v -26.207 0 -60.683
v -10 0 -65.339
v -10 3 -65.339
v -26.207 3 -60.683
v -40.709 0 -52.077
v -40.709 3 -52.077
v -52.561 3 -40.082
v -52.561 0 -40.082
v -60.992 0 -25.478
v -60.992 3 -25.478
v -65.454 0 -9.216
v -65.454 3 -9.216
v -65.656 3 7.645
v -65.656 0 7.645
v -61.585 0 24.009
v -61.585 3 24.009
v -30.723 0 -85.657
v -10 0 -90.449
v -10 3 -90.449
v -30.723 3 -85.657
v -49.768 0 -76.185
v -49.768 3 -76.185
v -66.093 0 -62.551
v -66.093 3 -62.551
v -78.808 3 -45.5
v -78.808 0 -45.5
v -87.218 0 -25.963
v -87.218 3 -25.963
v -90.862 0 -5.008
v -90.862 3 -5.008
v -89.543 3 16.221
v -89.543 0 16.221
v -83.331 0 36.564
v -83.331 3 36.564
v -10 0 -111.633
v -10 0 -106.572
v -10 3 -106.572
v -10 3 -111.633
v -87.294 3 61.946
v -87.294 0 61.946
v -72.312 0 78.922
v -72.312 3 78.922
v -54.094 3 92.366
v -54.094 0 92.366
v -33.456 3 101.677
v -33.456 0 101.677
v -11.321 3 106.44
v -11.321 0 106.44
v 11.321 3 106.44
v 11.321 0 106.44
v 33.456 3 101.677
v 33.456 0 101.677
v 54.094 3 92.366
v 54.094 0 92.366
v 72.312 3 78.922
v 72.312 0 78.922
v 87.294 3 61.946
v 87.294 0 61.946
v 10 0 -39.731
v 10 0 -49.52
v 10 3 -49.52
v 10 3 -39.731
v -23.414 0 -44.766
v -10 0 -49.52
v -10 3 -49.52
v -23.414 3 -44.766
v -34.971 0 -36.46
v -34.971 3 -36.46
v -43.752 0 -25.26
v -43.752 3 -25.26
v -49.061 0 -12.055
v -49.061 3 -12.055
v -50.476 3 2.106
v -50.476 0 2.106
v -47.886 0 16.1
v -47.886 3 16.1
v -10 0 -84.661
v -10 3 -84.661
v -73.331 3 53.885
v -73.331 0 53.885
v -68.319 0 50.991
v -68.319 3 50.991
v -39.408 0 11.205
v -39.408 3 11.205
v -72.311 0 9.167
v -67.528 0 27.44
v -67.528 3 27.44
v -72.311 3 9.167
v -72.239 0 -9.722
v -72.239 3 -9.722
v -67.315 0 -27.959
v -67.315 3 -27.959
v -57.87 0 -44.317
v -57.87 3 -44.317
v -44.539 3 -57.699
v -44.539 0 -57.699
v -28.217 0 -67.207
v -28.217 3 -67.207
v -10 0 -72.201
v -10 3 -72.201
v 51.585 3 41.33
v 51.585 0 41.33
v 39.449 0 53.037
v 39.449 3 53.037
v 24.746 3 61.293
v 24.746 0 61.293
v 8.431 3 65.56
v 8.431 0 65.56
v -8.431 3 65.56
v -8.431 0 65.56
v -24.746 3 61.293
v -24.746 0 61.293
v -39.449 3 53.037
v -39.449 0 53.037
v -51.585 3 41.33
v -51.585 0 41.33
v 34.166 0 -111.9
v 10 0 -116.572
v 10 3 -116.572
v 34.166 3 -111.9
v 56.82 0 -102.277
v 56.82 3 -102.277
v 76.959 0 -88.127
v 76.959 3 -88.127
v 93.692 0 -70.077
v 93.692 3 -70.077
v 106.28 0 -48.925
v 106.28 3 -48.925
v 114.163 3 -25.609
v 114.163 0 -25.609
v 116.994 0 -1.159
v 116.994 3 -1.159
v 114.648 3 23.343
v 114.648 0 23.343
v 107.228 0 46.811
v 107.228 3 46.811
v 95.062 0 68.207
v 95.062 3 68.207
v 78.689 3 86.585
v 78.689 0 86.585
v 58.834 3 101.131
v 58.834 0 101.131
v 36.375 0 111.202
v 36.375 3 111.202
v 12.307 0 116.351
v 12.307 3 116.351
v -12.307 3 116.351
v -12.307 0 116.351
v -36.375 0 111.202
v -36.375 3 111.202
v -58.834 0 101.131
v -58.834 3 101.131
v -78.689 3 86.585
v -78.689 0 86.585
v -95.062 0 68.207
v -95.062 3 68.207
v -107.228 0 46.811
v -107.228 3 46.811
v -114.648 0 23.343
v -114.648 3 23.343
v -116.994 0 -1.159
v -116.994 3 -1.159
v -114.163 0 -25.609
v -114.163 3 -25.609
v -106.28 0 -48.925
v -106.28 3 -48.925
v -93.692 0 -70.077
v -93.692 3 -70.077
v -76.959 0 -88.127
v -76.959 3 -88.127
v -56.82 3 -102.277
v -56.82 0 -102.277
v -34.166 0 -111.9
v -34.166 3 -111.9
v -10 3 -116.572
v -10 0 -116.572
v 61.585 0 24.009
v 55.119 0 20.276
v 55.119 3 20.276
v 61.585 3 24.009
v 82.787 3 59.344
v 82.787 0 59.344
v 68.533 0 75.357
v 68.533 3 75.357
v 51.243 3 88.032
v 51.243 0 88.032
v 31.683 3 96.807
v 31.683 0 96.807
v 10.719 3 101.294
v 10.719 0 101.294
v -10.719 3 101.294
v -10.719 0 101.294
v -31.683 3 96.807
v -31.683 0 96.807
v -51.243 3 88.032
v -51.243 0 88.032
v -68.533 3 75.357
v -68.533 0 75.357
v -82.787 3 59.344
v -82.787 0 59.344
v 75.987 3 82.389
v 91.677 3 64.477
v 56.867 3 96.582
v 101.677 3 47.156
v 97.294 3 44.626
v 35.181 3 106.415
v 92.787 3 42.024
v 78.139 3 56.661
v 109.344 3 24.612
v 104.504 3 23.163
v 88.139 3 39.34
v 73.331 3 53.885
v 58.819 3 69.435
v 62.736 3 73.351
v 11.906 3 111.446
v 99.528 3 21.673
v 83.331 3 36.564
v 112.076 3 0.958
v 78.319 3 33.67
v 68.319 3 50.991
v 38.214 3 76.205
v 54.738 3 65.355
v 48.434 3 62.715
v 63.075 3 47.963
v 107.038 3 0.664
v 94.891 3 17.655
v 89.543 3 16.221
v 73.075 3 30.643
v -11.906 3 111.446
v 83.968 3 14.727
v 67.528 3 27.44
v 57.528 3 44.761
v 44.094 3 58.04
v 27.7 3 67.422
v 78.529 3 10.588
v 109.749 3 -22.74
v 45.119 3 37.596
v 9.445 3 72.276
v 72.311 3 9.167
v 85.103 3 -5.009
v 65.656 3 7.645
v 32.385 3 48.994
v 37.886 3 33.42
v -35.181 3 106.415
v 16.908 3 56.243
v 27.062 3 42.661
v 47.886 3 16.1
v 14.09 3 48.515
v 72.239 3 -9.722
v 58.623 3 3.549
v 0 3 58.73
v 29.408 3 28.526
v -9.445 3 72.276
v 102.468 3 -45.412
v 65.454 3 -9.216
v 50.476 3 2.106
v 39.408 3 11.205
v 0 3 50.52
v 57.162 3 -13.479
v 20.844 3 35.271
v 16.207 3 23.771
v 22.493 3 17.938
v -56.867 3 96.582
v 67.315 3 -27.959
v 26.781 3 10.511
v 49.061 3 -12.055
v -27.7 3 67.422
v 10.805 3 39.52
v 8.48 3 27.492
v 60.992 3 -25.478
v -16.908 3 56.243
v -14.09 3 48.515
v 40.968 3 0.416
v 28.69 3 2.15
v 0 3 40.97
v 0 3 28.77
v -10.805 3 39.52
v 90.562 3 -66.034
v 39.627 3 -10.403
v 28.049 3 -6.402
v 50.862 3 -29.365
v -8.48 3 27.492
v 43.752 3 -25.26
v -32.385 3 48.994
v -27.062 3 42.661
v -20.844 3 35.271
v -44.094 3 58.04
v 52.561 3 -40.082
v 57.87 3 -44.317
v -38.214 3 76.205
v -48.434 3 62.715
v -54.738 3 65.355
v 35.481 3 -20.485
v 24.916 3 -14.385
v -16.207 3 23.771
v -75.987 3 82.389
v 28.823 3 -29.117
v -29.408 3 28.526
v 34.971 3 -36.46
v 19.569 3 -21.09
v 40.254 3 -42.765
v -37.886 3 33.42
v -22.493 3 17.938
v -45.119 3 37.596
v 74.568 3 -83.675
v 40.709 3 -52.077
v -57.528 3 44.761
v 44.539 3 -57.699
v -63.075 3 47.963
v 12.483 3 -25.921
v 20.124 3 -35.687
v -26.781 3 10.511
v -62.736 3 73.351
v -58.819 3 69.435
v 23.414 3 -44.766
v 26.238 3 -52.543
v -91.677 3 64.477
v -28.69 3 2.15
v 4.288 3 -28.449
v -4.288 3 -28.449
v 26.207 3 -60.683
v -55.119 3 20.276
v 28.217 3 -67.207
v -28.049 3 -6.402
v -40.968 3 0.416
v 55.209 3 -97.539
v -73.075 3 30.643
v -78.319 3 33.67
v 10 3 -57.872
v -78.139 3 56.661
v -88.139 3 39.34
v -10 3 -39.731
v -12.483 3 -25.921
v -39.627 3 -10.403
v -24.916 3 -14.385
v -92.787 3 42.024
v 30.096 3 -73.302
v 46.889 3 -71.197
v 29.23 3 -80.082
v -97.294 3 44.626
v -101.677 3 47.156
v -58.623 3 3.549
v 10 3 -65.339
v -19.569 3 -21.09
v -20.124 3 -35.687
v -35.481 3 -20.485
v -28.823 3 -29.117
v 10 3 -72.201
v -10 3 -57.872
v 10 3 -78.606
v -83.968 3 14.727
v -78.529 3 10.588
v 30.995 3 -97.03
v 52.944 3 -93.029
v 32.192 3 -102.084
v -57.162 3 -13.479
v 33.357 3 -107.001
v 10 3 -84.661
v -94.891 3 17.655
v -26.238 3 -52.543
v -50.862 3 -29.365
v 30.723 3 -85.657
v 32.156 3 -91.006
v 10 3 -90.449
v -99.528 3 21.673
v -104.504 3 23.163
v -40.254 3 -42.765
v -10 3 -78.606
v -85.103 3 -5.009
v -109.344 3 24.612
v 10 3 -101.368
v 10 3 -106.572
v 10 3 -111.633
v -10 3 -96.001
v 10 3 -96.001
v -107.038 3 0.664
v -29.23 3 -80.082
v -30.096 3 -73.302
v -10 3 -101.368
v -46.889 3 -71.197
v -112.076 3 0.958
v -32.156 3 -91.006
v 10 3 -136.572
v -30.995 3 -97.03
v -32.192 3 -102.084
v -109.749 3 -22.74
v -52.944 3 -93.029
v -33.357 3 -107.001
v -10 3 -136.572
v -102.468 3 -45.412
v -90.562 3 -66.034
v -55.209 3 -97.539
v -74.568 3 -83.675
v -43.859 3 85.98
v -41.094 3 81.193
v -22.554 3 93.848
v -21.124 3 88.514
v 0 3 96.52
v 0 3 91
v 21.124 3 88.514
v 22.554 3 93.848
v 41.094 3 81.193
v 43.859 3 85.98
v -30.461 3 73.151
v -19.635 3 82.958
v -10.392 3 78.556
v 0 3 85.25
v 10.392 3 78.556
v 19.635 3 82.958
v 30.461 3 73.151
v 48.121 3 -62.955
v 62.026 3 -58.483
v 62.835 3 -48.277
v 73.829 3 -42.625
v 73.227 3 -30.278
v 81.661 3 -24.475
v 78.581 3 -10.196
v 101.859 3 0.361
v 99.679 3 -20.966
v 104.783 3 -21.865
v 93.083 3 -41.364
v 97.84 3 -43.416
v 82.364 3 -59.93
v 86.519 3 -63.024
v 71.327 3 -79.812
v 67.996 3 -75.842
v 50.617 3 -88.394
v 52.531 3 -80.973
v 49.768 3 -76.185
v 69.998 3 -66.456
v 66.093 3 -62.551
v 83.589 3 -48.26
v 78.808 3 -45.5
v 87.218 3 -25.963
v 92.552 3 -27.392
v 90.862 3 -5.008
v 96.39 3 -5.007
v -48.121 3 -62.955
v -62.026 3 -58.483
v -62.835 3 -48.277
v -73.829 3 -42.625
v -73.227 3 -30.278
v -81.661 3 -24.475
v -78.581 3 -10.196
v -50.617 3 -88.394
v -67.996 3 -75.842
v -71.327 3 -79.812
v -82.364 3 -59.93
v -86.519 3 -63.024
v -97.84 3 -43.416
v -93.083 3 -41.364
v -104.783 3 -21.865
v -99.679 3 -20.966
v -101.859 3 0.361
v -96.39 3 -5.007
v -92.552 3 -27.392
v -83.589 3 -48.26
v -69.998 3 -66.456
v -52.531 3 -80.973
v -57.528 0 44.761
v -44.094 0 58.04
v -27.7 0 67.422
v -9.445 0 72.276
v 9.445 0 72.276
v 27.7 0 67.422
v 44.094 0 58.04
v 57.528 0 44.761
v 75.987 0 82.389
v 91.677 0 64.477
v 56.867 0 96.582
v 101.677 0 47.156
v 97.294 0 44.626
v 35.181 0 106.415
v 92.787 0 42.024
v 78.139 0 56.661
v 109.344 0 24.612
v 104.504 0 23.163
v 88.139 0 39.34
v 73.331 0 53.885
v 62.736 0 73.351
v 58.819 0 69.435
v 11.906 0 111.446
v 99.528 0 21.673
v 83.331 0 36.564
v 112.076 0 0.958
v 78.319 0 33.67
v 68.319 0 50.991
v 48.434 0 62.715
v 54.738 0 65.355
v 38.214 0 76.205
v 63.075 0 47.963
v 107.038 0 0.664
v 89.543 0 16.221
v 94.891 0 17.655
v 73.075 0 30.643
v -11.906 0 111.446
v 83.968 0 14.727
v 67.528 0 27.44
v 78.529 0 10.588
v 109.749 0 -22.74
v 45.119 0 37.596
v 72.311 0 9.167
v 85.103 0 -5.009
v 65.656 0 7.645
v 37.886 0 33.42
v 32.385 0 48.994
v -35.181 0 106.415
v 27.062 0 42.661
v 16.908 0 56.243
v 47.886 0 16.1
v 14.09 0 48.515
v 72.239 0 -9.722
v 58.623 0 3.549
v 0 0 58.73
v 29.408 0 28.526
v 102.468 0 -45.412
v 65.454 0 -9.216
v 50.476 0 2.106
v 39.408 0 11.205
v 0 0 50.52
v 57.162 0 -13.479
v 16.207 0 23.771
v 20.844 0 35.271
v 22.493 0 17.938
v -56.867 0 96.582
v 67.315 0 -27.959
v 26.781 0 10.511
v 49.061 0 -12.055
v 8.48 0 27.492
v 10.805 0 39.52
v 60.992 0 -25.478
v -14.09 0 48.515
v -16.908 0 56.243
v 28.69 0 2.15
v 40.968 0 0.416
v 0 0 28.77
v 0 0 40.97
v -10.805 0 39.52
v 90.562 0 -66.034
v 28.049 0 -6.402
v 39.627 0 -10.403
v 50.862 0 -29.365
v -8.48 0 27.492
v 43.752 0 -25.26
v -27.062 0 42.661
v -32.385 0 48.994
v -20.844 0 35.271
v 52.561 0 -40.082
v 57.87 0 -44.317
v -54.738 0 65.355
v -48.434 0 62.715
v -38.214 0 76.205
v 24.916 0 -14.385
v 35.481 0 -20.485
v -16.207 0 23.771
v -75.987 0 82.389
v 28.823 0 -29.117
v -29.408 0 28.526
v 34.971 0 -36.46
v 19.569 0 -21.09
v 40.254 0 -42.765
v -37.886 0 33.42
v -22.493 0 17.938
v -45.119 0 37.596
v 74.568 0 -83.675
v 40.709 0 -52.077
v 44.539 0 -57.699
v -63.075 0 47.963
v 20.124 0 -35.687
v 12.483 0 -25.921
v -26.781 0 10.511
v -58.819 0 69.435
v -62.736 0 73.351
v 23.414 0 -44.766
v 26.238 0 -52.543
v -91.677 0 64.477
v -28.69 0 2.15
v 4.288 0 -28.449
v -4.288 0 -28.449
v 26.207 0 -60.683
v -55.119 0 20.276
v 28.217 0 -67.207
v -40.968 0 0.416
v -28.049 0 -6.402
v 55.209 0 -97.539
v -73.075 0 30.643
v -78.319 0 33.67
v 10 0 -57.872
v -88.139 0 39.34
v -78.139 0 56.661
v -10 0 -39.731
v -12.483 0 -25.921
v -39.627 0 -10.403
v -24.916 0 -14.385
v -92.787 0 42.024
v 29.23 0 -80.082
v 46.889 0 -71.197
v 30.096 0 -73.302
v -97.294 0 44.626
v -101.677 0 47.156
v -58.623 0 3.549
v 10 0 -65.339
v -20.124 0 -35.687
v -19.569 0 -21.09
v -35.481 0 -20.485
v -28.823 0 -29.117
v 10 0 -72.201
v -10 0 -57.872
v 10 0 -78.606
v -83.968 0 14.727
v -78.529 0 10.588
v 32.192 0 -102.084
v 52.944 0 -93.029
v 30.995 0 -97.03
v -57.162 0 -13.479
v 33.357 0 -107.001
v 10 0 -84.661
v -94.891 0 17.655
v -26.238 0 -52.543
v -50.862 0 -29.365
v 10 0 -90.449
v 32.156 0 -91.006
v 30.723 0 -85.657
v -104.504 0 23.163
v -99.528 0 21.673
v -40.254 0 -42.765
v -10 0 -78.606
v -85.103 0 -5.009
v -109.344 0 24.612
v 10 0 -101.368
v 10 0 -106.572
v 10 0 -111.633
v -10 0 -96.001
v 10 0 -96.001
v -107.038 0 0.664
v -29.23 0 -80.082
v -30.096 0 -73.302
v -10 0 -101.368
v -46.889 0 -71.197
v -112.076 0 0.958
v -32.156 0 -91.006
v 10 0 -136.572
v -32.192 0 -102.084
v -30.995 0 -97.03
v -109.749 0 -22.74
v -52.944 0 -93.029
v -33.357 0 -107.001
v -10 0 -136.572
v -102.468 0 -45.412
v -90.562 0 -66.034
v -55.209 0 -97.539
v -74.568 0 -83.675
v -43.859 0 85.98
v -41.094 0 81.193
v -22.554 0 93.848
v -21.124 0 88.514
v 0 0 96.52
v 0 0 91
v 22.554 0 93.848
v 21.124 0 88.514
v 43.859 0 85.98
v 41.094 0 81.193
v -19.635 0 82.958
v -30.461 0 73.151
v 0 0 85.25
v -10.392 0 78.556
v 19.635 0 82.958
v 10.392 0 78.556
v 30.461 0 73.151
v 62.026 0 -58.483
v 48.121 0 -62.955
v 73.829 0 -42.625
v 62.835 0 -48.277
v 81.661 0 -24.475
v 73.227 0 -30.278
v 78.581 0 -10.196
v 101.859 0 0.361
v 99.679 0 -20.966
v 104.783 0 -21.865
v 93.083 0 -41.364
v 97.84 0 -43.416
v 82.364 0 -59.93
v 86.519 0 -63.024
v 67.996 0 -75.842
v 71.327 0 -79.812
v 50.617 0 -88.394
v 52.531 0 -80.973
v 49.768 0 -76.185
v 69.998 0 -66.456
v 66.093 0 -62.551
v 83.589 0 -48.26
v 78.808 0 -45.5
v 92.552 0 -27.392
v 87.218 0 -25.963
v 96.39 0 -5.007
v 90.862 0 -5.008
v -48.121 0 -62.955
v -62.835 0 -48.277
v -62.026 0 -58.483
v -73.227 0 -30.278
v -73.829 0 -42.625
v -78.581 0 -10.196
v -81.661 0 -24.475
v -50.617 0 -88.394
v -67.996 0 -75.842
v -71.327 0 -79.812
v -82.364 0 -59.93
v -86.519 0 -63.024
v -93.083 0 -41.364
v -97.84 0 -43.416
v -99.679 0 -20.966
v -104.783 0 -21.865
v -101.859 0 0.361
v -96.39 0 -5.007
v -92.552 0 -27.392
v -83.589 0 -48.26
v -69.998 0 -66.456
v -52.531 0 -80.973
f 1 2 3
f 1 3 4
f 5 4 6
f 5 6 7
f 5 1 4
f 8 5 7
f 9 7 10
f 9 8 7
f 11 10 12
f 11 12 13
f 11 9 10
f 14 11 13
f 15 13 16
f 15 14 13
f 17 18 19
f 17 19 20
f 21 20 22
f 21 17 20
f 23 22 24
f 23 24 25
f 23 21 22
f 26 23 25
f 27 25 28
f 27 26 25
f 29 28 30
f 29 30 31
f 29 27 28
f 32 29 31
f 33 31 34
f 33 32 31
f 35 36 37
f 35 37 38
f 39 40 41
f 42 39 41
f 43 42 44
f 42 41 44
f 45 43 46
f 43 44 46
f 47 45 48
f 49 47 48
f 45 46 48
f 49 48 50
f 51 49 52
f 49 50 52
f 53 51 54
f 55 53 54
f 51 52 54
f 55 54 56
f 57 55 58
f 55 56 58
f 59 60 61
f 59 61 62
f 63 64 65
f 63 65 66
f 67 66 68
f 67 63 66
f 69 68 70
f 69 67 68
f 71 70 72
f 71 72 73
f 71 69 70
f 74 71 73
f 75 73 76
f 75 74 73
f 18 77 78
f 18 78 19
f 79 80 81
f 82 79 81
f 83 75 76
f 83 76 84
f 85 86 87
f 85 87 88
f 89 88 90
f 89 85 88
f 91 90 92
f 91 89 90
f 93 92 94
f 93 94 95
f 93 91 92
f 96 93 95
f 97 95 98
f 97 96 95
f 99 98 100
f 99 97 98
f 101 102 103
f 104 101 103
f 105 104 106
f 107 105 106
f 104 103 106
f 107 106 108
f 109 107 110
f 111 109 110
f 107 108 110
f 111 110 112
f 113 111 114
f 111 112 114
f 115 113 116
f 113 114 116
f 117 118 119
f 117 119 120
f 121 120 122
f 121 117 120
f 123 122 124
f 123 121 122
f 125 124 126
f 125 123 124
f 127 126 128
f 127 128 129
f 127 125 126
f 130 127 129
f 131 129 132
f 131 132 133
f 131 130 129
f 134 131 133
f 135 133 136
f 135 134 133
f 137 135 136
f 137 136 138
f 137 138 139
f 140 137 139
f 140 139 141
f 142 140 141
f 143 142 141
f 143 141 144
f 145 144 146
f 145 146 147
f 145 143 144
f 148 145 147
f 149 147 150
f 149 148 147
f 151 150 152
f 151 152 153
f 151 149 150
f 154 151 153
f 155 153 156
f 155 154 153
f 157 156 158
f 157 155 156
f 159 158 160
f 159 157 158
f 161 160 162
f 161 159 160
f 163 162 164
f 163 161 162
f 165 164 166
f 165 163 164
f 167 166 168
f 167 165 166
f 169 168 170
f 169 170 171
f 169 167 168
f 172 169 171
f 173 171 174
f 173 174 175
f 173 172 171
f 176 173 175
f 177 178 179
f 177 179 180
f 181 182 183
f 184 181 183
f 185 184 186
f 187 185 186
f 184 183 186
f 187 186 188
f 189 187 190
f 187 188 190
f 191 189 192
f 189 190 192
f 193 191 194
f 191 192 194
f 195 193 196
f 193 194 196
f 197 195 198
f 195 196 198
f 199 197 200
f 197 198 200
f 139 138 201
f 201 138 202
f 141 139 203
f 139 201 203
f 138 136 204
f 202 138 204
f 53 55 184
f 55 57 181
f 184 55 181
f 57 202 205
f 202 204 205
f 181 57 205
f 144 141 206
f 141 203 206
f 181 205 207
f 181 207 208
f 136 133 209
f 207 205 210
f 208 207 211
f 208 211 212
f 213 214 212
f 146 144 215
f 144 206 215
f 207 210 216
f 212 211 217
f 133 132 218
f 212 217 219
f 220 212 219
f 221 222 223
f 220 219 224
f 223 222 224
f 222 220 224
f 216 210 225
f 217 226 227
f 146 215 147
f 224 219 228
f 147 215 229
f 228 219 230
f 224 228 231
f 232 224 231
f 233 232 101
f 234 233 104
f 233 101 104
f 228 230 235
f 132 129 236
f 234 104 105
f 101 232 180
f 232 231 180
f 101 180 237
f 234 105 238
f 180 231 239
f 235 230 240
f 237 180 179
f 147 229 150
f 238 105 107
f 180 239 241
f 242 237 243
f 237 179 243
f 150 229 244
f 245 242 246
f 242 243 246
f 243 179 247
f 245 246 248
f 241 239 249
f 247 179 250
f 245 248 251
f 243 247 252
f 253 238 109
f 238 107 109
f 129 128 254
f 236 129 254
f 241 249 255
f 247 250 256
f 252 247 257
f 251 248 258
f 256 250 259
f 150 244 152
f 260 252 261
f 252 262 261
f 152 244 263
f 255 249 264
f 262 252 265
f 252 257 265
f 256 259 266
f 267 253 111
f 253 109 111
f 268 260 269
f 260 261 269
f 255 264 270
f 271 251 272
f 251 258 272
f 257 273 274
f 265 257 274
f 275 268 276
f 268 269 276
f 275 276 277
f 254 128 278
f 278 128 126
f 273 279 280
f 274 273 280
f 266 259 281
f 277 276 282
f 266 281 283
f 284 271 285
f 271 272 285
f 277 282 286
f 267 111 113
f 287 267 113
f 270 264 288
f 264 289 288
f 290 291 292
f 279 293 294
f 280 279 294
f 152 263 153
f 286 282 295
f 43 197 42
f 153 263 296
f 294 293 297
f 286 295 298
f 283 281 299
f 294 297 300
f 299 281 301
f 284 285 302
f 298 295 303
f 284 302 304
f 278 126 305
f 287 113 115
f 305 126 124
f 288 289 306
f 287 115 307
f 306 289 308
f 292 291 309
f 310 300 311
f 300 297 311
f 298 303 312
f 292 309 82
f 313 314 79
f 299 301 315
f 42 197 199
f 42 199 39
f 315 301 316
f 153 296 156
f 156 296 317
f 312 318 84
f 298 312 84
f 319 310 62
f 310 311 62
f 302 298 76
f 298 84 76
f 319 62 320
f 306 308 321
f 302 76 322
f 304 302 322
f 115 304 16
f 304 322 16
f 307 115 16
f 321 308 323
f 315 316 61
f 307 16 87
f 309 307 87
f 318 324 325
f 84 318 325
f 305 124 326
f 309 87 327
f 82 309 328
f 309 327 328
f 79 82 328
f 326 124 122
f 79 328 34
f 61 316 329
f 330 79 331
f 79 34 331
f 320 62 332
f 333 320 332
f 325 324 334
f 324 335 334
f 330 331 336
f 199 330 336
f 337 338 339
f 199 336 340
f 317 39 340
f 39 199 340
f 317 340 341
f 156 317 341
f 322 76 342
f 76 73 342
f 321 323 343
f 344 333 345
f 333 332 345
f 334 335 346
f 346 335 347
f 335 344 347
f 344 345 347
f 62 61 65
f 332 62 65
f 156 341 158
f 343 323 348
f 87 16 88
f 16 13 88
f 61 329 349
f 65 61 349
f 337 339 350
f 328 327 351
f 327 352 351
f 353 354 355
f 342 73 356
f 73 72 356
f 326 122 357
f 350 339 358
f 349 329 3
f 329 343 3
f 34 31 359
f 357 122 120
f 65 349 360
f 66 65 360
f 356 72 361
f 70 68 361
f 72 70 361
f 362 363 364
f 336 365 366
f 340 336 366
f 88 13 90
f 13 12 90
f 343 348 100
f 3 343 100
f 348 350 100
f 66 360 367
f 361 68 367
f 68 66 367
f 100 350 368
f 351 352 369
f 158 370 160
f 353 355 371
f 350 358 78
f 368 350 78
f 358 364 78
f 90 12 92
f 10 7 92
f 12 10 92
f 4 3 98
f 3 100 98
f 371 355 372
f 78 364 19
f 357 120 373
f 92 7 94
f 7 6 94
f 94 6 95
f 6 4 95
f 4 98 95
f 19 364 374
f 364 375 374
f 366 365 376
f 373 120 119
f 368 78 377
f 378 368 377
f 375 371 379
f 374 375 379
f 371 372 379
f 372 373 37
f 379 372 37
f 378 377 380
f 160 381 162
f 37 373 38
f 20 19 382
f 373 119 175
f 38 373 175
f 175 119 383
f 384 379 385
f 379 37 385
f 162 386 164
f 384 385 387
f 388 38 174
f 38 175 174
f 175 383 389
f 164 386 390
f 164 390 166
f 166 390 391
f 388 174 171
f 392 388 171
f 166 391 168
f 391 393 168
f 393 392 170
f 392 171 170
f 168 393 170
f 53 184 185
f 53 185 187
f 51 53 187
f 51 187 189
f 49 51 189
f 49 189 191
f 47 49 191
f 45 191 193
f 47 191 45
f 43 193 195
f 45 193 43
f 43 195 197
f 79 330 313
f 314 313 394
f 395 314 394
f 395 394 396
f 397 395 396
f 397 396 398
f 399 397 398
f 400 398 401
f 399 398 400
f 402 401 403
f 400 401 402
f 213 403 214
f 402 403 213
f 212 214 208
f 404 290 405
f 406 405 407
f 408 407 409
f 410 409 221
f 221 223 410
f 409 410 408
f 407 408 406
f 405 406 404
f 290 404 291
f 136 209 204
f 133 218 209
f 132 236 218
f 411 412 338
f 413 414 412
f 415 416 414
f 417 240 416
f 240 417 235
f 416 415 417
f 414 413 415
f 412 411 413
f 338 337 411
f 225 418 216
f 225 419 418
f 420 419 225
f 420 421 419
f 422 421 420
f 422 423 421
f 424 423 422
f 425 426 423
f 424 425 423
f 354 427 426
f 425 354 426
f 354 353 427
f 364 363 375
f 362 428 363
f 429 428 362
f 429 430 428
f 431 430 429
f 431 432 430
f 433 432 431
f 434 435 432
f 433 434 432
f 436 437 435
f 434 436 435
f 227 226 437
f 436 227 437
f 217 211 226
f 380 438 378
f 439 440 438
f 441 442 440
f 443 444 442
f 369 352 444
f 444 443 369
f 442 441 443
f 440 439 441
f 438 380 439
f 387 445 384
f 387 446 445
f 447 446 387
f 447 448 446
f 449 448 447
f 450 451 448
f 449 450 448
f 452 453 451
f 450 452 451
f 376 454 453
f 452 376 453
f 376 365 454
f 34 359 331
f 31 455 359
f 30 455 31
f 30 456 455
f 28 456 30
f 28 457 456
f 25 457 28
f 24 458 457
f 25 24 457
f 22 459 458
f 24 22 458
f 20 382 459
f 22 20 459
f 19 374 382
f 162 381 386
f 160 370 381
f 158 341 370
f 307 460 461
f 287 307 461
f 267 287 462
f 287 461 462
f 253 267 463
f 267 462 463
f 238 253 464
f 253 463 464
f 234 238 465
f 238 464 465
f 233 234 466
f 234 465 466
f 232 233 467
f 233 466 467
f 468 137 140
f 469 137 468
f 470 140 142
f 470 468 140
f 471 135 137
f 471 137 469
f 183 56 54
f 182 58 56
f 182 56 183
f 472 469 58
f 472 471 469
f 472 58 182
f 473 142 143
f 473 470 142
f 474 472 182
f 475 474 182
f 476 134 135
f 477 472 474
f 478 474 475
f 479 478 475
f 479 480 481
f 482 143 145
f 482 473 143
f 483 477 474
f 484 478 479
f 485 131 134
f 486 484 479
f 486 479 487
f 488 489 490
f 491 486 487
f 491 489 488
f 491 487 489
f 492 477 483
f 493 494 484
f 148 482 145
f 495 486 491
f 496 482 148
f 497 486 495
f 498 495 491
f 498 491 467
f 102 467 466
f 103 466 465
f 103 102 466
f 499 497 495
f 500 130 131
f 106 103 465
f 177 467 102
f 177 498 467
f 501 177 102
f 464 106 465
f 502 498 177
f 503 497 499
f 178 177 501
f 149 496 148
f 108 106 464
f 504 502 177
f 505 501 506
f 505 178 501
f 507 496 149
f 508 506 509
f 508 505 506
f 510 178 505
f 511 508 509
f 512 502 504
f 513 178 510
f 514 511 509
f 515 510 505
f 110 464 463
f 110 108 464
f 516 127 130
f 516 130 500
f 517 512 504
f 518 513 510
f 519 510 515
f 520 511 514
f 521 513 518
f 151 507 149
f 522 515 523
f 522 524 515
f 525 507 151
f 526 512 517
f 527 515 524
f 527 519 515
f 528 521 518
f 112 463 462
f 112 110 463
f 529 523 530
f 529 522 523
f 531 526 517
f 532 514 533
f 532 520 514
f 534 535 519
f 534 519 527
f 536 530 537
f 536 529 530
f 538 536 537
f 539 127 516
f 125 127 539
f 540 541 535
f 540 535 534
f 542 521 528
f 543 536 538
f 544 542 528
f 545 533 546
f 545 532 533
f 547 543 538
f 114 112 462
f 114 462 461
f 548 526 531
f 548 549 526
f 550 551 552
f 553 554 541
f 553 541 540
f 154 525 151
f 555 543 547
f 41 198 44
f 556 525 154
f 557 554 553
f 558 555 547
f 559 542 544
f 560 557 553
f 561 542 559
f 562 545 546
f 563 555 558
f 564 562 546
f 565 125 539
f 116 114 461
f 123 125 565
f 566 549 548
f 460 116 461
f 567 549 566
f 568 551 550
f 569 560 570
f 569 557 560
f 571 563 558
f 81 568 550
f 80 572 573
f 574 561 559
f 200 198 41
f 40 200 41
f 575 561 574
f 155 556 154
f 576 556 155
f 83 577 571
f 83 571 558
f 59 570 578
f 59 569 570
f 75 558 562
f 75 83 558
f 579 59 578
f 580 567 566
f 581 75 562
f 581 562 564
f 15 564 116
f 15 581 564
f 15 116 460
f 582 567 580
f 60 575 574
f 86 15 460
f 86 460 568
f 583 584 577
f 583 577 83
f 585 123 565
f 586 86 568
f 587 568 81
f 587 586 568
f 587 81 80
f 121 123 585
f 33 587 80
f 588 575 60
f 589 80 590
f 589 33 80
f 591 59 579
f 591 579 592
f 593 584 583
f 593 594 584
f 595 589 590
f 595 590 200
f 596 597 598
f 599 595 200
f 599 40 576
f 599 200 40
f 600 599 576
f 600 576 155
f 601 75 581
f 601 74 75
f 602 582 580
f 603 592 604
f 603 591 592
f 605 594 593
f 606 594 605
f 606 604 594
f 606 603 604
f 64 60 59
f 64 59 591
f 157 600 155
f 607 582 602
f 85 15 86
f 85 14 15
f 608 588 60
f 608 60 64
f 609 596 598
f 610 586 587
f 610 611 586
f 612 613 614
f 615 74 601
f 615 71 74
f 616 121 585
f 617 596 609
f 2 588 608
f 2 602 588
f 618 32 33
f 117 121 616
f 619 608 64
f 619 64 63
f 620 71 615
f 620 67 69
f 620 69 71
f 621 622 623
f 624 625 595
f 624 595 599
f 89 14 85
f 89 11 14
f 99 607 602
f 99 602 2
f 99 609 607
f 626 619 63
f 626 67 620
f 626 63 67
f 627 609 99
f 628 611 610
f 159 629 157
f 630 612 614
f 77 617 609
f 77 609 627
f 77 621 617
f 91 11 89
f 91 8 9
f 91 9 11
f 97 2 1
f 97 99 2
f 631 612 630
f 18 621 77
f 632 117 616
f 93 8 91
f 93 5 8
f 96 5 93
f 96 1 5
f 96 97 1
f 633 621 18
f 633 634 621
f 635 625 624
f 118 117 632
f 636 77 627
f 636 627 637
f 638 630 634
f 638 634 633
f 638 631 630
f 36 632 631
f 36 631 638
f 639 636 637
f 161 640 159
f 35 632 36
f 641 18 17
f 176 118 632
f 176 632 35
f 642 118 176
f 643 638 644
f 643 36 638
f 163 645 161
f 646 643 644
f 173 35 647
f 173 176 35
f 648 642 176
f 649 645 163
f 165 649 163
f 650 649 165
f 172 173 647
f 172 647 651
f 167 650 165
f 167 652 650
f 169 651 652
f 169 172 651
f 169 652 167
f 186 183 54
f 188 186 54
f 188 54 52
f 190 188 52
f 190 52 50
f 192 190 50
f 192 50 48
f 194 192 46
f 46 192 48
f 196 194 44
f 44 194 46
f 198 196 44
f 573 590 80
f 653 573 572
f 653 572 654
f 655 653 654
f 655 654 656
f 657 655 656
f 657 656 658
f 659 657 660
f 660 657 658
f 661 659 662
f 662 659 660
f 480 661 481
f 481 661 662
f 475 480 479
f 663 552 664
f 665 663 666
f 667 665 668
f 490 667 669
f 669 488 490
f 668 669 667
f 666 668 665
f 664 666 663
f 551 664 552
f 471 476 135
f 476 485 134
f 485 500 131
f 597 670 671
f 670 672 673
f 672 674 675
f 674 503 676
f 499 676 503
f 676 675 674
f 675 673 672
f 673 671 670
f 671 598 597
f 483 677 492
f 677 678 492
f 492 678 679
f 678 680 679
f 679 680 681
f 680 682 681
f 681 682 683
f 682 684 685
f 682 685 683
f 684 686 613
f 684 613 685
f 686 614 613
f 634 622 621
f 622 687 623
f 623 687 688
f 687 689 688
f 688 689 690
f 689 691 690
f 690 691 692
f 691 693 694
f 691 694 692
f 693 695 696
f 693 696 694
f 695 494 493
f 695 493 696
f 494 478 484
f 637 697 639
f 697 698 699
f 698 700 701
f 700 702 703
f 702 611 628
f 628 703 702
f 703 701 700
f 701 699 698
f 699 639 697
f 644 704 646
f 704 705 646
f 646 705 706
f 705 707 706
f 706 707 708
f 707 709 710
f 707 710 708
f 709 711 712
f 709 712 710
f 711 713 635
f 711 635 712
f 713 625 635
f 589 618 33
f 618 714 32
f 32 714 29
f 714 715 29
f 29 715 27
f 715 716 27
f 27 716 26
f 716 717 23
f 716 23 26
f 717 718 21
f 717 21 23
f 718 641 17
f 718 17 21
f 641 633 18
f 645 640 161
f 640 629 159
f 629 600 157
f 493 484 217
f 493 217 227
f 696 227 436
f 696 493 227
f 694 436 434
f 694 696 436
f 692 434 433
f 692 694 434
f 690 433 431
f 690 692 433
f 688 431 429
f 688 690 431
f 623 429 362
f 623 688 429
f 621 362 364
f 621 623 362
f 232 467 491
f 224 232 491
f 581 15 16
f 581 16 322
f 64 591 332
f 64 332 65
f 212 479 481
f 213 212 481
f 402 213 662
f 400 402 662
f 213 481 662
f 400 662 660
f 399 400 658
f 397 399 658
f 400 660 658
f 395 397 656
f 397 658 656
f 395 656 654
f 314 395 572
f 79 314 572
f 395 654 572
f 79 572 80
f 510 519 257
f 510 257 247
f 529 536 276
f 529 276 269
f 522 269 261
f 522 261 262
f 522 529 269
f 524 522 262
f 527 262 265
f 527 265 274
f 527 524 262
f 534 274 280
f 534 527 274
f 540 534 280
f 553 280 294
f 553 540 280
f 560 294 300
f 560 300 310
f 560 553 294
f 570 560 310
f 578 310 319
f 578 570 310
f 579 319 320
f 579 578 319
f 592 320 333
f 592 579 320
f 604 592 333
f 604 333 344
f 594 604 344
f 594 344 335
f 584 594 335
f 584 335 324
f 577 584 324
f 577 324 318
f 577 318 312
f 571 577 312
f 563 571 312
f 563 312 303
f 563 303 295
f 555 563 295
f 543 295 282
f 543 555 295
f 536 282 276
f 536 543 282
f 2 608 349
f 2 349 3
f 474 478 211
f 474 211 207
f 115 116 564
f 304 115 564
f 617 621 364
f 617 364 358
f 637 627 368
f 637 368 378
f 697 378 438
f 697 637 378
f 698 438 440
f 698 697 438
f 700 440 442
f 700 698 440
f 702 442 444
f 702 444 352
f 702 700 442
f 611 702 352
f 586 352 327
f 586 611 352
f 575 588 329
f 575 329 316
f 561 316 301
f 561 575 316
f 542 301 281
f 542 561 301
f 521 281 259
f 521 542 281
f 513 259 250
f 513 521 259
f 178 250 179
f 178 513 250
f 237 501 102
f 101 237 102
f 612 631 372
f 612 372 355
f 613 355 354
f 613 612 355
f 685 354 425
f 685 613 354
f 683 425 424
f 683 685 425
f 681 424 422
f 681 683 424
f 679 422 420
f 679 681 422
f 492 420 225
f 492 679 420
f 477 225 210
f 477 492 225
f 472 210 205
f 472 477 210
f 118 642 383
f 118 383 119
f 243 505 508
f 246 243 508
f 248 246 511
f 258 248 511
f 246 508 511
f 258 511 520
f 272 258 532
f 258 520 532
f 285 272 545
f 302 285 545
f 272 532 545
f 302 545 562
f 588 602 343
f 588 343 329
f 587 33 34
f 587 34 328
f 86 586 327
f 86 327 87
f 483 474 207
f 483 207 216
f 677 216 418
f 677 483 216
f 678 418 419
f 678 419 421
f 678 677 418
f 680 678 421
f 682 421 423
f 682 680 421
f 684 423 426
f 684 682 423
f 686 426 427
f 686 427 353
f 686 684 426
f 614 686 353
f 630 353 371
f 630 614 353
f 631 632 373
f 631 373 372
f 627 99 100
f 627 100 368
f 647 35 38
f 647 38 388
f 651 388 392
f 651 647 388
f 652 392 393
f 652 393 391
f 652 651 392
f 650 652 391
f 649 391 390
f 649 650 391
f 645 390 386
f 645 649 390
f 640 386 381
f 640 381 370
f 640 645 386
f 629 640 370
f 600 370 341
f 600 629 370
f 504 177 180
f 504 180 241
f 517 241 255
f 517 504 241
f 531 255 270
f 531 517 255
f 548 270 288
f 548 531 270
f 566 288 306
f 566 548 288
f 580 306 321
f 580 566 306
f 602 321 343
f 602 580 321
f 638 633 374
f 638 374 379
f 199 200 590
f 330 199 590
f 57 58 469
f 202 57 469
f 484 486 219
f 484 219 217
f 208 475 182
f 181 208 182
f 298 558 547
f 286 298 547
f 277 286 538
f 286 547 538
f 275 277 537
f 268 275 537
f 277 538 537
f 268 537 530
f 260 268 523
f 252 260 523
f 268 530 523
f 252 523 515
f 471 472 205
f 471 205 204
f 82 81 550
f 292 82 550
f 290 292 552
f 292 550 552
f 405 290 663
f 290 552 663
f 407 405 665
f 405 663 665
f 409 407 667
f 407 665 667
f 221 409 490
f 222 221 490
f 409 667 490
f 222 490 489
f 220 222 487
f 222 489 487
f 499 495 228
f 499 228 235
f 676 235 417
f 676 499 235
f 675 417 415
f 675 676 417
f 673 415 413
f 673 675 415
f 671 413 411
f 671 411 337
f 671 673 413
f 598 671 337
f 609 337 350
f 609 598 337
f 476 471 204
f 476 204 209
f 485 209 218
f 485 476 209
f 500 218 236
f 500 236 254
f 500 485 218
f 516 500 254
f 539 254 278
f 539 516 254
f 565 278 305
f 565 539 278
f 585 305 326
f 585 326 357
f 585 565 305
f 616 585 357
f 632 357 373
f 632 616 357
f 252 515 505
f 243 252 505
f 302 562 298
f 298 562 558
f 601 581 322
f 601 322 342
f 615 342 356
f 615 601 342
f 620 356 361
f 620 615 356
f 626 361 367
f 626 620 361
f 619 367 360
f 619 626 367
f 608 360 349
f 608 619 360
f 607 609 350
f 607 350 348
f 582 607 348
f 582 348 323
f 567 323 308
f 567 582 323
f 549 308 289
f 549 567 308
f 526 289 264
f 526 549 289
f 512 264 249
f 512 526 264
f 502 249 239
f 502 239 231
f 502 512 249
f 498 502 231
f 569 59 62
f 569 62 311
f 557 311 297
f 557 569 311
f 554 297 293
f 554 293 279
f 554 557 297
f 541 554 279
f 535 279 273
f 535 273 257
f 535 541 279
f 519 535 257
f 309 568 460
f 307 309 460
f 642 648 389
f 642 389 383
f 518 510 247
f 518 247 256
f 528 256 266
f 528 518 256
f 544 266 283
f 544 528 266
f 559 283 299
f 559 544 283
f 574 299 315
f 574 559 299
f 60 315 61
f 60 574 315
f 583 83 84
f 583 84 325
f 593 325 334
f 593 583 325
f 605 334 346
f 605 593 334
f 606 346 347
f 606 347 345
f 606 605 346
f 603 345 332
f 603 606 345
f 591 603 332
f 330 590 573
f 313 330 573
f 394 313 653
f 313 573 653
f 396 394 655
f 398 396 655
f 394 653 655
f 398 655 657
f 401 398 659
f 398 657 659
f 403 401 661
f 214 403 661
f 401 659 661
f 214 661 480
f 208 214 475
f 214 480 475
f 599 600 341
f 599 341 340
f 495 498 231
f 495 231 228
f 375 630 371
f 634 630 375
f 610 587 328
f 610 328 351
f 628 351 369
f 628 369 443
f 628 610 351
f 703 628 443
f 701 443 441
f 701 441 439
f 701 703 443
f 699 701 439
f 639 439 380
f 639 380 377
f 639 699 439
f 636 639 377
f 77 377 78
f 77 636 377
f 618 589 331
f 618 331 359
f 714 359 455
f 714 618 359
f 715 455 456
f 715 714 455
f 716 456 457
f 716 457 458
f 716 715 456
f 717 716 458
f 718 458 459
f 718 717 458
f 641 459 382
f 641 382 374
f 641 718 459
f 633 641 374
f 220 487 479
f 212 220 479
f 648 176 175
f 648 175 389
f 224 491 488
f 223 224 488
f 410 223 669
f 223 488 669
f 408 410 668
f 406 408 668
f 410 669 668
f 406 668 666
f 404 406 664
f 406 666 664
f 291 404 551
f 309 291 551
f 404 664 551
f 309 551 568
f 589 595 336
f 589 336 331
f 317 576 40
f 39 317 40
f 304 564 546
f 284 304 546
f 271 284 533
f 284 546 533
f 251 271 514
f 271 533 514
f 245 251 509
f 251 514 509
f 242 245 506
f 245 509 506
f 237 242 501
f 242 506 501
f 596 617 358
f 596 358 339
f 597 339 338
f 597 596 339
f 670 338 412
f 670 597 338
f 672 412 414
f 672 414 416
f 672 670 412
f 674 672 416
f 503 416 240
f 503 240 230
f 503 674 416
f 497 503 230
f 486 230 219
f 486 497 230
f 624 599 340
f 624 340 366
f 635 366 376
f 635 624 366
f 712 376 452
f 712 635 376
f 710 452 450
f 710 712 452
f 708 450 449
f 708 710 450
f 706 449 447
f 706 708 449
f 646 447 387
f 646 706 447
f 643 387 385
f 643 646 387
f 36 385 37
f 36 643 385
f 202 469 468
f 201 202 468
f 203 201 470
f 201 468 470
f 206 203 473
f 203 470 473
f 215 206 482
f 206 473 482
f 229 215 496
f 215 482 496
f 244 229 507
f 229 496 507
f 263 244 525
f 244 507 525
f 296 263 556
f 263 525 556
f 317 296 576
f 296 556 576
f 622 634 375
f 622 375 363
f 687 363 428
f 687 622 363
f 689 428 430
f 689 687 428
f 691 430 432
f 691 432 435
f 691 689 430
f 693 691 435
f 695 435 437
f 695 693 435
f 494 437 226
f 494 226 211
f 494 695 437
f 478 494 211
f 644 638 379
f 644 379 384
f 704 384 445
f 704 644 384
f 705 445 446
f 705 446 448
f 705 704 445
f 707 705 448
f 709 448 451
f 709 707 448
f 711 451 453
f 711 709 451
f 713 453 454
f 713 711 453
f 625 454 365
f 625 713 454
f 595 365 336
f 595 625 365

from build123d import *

# Parameters (mm, degrees)
SKETCH_4_R      = 28.77
EXTRUDE_2_DEPTH = 3


with BuildPart() as part:
    # 草图4 → 凸台-拉伸2 (new body)
    with BuildSketch(Plane(origin=(0, 0, 0), x_dir=(1, 0, 0), z_dir=(0, 1, 0))):
        with BuildLine():
            Line((-10, 116.571866246), (-10, 136.571866246))
            Line((-10, 136.571866246), (10, 136.571866246))
            Line((10, 136.571866246), (10, 116.571866246))
            ThreePointArc((10, 116.571866246), (0, -117), (-10, 116.571866246))
        make_face()
        with Locations(Location((0, 0, 0), (0, 0, 270))):
            Circle(SKETCH_4_R, mode=Mode.SUBTRACT)
        with BuildLine():
            Line((-101.67701278, -47.156245315), (-97.293939129, -44.625676563))
            ThreePointArc((-97.293939129, -44.625676563), (-92.699359221, 53.52), (-10, 106.571861202))
            Line((-10, 106.571861202), (-10, 111.632998706))
            ThreePointArc((-10, 111.632998706), (-97.064127256, 56.04), (-101.67701278, -47.156245315))
        make_face(mode=Mode.SUBTRACT)
        with BuildLine():
            Line((-92.787212622, -42.023716801), (-88.138936726, -39.340033461))
            ThreePointArc((-88.138936726, -39.340033461), (-83.588771973, 48.26), (-10, 96.000574998))
            Line((-10, 96.000574998), (-10, 101.367941678))
            ThreePointArc((-10, 101.367941678), (-88.213347629, 50.93), (-92.787212622, -42.023716801))
        make_face(mode=Mode.SUBTRACT)
        with BuildLine():
            Line((-83.331028335, -36.564186257), (-78.318973499, -33.670475049))
            ThreePointArc((-78.318973499, -33.670475049), (-73.828665673, 42.625), (-10, 84.661458173))
            Line((-10, 84.661458173), (-10, 90.44888059))
            ThreePointArc((-10, 90.44888059), (-78.808311744, 45.5), (-83.331028335, -36.564186257))
        make_face(mode=Mode.SUBTRACT)
        with BuildLine():
            Line((-73.075202534, -30.64298247), (-67.527706459, -27.440134118))
            ThreePointArc((-67.527706459, -27.440134118), (-63.124591682, 36.445), (-10, 72.200776312))
            Line((-10, 72.200776312), (-10, 78.606473016))
            ThreePointArc((-10, 78.606473016), (-68.623852996, 39.62), (-73.075202534, -30.64298247))
        make_face(mode=Mode.SUBTRACT)
        with BuildLine():
            Line((-61.58540006, -24.009341919), (-55.118955246, -20.275938265))
            ThreePointArc((-55.118955246, -20.275938265), (-50.861671964, 29.365), (-10, 57.872384606))
            Line((-10, 57.872384606), (-10, 65.339191914))
            ThreePointArc((-10, 65.339191914), (-57.24427919, 33.05), (-61.58540006, -24.009341919))
        make_face(mode=Mode.SUBTRACT)
        with BuildLine():
            Line((-47.885927762, -16.0999479), (-39.407930409, -11.205173846))
            ThreePointArc((-39.407930409, -11.205173846), (-35.481060793, 20.485), (-10, 39.730855767))
            Line((-10, 39.730855767), (-10, 49.520403876))
            ThreePointArc((-10, 49.520403876), (-43.751603399, 25.26), (-47.885927762, -16.0999479))
        make_face(mode=Mode.SUBTRACT)
        with BuildLine():
            Line((-37.885927762, -33.420455976), (-29.407930409, -28.525681921))
            ThreePointArc((-29.407930409, -28.525681921), (0, -40.97), (29.407930409, -28.525681921))
            Line((29.407930409, -28.525681921), (37.885927762, -33.420455976))
            ThreePointArc((37.885927762, -33.420455976), (0, -50.52), (-37.885927762, -33.420455976))
        make_face(mode=Mode.SUBTRACT)
        with BuildLine():
            Line((-51.58540006, -41.329849995), (-45.118955246, -37.596446341))
            ThreePointArc((-45.118955246, -37.596446341), (0, -58.73), (45.118955246, -37.596446341))
            Line((45.118955246, -37.596446341), (51.58540006, -41.329849995))
            ThreePointArc((51.58540006, -41.329849995), (0, -66.1), (-51.58540006, -41.329849995))
        make_face(mode=Mode.SUBTRACT)
        with BuildLine():
            Line((-63.075202534, -47.963490546), (-57.527706459, -44.760642194))
            ThreePointArc((-57.527706459, -44.760642194), (0, -72.89), (57.527706459, -44.760642194))
            Line((57.527706459, -44.760642194), (63.075202534, -47.963490546))
            ThreePointArc((63.075202534, -47.963490546), (0, -79.24), (-63.075202534, -47.963490546))
        make_face(mode=Mode.SUBTRACT)
        with BuildLine():
            Line((-82.787212622, -59.344224877), (-78.138936726, -56.660541537))
            ThreePointArc((-78.138936726, -56.660541537), (0, -96.52), (78.138936726, -56.660541537))
            Line((78.138936726, -56.660541537), (82.787212622, -59.344224877))
            ThreePointArc((82.787212622, -59.344224877), (0, -101.86), (-82.787212622, -59.344224877))
        make_face(mode=Mode.SUBTRACT)
        with BuildLine():
            Line((-73.331028335, -53.884694333), (-68.318973499, -50.990983124))
            ThreePointArc((-68.318973499, -50.990983124), (0, -85.25), (68.318973499, -50.990983124))
            Line((68.318973499, -50.990983124), (73.331028335, -53.884694333))
            ThreePointArc((73.331028335, -53.884694333), (0, -91), (-73.331028335, -53.884694333))
        make_face(mode=Mode.SUBTRACT)
        with BuildLine():
            Line((-91.67701278, -64.476753391), (-87.293939129, -61.946184639))
            ThreePointArc((-87.293939129, -61.946184639), (0, -107.04), (87.293939129, -61.946184639))
            Line((87.293939129, -61.946184639), (91.67701278, -64.476753391))
            ThreePointArc((91.67701278, -64.476753391), (0, -112.08), (-91.67701278, -64.476753391))
        make_face(mode=Mode.SUBTRACT)
        with BuildLine():
            Line((10, 49.520403876), (10, 39.730855767))
            ThreePointArc((10, 39.730855767), (35.481060793, 20.485), (39.407930409, -11.205173846))
            Line((39.407930409, -11.205173846), (47.885927762, -16.0999479))
            ThreePointArc((47.885927762, -16.0999479), (43.751603399, 25.26), (10, 49.520403876))
        make_face(mode=Mode.SUBTRACT)
        with BuildLine():
            Line((10, 65.339191914), (10, 57.872384606))
            ThreePointArc((10, 57.872384606), (50.861671964, 29.365), (55.118955246, -20.275938265))
            Line((55.118955246, -20.275938265), (61.58540006, -24.009341919))
            ThreePointArc((61.58540006, -24.009341919), (57.24427919, 33.05), (10, 65.339191914))
        make_face(mode=Mode.SUBTRACT)
        with BuildLine():
            Line((10, 78.606473016), (10, 72.200776312))
            ThreePointArc((10, 72.200776312), (63.124591682, 36.445), (67.527706459, -27.440134118))
            Line((67.527706459, -27.440134118), (73.075202534, -30.64298247))
            ThreePointArc((73.075202534, -30.64298247), (68.623852996, 39.62), (10, 78.606473016))
        make_face(mode=Mode.SUBTRACT)
        with BuildLine():
            Line((10, 90.44888059), (10, 84.661458173))
            ThreePointArc((10, 84.661458173), (73.828665673, 42.625), (78.318973499, -33.670475049))
            Line((78.318973499, -33.670475049), (83.331028335, -36.564186257))
            ThreePointArc((83.331028335, -36.564186257), (78.808311744, 45.5), (10, 90.44888059))
        make_face(mode=Mode.SUBTRACT)
        with BuildLine():
            Line((10, 101.367941678), (10, 96.000574998))
            ThreePointArc((10, 96.000574998), (83.588771973, 48.26), (88.138936726, -39.340033461))
            Line((88.138936726, -39.340033461), (92.787212622, -42.023716801))
            ThreePointArc((92.787212622, -42.023716801), (88.213347629, 50.93), (10, 101.367941678))
        make_face(mode=Mode.SUBTRACT)
        with BuildLine():
            Line((10, 111.632998706), (10, 106.571861202))
            ThreePointArc((10, 106.571861202), (92.699359221, 53.52), (97.293939129, -44.625676563))
            Line((97.293939129, -44.625676563), (101.67701278, -47.156245315))
            ThreePointArc((101.67701278, -47.156245315), (97.064127256, 56.04), (10, 111.632998706))
        make_face(mode=Mode.SUBTRACT)
    extrude(amount=EXTRUDE_2_DEPTH)


solid = part.part
